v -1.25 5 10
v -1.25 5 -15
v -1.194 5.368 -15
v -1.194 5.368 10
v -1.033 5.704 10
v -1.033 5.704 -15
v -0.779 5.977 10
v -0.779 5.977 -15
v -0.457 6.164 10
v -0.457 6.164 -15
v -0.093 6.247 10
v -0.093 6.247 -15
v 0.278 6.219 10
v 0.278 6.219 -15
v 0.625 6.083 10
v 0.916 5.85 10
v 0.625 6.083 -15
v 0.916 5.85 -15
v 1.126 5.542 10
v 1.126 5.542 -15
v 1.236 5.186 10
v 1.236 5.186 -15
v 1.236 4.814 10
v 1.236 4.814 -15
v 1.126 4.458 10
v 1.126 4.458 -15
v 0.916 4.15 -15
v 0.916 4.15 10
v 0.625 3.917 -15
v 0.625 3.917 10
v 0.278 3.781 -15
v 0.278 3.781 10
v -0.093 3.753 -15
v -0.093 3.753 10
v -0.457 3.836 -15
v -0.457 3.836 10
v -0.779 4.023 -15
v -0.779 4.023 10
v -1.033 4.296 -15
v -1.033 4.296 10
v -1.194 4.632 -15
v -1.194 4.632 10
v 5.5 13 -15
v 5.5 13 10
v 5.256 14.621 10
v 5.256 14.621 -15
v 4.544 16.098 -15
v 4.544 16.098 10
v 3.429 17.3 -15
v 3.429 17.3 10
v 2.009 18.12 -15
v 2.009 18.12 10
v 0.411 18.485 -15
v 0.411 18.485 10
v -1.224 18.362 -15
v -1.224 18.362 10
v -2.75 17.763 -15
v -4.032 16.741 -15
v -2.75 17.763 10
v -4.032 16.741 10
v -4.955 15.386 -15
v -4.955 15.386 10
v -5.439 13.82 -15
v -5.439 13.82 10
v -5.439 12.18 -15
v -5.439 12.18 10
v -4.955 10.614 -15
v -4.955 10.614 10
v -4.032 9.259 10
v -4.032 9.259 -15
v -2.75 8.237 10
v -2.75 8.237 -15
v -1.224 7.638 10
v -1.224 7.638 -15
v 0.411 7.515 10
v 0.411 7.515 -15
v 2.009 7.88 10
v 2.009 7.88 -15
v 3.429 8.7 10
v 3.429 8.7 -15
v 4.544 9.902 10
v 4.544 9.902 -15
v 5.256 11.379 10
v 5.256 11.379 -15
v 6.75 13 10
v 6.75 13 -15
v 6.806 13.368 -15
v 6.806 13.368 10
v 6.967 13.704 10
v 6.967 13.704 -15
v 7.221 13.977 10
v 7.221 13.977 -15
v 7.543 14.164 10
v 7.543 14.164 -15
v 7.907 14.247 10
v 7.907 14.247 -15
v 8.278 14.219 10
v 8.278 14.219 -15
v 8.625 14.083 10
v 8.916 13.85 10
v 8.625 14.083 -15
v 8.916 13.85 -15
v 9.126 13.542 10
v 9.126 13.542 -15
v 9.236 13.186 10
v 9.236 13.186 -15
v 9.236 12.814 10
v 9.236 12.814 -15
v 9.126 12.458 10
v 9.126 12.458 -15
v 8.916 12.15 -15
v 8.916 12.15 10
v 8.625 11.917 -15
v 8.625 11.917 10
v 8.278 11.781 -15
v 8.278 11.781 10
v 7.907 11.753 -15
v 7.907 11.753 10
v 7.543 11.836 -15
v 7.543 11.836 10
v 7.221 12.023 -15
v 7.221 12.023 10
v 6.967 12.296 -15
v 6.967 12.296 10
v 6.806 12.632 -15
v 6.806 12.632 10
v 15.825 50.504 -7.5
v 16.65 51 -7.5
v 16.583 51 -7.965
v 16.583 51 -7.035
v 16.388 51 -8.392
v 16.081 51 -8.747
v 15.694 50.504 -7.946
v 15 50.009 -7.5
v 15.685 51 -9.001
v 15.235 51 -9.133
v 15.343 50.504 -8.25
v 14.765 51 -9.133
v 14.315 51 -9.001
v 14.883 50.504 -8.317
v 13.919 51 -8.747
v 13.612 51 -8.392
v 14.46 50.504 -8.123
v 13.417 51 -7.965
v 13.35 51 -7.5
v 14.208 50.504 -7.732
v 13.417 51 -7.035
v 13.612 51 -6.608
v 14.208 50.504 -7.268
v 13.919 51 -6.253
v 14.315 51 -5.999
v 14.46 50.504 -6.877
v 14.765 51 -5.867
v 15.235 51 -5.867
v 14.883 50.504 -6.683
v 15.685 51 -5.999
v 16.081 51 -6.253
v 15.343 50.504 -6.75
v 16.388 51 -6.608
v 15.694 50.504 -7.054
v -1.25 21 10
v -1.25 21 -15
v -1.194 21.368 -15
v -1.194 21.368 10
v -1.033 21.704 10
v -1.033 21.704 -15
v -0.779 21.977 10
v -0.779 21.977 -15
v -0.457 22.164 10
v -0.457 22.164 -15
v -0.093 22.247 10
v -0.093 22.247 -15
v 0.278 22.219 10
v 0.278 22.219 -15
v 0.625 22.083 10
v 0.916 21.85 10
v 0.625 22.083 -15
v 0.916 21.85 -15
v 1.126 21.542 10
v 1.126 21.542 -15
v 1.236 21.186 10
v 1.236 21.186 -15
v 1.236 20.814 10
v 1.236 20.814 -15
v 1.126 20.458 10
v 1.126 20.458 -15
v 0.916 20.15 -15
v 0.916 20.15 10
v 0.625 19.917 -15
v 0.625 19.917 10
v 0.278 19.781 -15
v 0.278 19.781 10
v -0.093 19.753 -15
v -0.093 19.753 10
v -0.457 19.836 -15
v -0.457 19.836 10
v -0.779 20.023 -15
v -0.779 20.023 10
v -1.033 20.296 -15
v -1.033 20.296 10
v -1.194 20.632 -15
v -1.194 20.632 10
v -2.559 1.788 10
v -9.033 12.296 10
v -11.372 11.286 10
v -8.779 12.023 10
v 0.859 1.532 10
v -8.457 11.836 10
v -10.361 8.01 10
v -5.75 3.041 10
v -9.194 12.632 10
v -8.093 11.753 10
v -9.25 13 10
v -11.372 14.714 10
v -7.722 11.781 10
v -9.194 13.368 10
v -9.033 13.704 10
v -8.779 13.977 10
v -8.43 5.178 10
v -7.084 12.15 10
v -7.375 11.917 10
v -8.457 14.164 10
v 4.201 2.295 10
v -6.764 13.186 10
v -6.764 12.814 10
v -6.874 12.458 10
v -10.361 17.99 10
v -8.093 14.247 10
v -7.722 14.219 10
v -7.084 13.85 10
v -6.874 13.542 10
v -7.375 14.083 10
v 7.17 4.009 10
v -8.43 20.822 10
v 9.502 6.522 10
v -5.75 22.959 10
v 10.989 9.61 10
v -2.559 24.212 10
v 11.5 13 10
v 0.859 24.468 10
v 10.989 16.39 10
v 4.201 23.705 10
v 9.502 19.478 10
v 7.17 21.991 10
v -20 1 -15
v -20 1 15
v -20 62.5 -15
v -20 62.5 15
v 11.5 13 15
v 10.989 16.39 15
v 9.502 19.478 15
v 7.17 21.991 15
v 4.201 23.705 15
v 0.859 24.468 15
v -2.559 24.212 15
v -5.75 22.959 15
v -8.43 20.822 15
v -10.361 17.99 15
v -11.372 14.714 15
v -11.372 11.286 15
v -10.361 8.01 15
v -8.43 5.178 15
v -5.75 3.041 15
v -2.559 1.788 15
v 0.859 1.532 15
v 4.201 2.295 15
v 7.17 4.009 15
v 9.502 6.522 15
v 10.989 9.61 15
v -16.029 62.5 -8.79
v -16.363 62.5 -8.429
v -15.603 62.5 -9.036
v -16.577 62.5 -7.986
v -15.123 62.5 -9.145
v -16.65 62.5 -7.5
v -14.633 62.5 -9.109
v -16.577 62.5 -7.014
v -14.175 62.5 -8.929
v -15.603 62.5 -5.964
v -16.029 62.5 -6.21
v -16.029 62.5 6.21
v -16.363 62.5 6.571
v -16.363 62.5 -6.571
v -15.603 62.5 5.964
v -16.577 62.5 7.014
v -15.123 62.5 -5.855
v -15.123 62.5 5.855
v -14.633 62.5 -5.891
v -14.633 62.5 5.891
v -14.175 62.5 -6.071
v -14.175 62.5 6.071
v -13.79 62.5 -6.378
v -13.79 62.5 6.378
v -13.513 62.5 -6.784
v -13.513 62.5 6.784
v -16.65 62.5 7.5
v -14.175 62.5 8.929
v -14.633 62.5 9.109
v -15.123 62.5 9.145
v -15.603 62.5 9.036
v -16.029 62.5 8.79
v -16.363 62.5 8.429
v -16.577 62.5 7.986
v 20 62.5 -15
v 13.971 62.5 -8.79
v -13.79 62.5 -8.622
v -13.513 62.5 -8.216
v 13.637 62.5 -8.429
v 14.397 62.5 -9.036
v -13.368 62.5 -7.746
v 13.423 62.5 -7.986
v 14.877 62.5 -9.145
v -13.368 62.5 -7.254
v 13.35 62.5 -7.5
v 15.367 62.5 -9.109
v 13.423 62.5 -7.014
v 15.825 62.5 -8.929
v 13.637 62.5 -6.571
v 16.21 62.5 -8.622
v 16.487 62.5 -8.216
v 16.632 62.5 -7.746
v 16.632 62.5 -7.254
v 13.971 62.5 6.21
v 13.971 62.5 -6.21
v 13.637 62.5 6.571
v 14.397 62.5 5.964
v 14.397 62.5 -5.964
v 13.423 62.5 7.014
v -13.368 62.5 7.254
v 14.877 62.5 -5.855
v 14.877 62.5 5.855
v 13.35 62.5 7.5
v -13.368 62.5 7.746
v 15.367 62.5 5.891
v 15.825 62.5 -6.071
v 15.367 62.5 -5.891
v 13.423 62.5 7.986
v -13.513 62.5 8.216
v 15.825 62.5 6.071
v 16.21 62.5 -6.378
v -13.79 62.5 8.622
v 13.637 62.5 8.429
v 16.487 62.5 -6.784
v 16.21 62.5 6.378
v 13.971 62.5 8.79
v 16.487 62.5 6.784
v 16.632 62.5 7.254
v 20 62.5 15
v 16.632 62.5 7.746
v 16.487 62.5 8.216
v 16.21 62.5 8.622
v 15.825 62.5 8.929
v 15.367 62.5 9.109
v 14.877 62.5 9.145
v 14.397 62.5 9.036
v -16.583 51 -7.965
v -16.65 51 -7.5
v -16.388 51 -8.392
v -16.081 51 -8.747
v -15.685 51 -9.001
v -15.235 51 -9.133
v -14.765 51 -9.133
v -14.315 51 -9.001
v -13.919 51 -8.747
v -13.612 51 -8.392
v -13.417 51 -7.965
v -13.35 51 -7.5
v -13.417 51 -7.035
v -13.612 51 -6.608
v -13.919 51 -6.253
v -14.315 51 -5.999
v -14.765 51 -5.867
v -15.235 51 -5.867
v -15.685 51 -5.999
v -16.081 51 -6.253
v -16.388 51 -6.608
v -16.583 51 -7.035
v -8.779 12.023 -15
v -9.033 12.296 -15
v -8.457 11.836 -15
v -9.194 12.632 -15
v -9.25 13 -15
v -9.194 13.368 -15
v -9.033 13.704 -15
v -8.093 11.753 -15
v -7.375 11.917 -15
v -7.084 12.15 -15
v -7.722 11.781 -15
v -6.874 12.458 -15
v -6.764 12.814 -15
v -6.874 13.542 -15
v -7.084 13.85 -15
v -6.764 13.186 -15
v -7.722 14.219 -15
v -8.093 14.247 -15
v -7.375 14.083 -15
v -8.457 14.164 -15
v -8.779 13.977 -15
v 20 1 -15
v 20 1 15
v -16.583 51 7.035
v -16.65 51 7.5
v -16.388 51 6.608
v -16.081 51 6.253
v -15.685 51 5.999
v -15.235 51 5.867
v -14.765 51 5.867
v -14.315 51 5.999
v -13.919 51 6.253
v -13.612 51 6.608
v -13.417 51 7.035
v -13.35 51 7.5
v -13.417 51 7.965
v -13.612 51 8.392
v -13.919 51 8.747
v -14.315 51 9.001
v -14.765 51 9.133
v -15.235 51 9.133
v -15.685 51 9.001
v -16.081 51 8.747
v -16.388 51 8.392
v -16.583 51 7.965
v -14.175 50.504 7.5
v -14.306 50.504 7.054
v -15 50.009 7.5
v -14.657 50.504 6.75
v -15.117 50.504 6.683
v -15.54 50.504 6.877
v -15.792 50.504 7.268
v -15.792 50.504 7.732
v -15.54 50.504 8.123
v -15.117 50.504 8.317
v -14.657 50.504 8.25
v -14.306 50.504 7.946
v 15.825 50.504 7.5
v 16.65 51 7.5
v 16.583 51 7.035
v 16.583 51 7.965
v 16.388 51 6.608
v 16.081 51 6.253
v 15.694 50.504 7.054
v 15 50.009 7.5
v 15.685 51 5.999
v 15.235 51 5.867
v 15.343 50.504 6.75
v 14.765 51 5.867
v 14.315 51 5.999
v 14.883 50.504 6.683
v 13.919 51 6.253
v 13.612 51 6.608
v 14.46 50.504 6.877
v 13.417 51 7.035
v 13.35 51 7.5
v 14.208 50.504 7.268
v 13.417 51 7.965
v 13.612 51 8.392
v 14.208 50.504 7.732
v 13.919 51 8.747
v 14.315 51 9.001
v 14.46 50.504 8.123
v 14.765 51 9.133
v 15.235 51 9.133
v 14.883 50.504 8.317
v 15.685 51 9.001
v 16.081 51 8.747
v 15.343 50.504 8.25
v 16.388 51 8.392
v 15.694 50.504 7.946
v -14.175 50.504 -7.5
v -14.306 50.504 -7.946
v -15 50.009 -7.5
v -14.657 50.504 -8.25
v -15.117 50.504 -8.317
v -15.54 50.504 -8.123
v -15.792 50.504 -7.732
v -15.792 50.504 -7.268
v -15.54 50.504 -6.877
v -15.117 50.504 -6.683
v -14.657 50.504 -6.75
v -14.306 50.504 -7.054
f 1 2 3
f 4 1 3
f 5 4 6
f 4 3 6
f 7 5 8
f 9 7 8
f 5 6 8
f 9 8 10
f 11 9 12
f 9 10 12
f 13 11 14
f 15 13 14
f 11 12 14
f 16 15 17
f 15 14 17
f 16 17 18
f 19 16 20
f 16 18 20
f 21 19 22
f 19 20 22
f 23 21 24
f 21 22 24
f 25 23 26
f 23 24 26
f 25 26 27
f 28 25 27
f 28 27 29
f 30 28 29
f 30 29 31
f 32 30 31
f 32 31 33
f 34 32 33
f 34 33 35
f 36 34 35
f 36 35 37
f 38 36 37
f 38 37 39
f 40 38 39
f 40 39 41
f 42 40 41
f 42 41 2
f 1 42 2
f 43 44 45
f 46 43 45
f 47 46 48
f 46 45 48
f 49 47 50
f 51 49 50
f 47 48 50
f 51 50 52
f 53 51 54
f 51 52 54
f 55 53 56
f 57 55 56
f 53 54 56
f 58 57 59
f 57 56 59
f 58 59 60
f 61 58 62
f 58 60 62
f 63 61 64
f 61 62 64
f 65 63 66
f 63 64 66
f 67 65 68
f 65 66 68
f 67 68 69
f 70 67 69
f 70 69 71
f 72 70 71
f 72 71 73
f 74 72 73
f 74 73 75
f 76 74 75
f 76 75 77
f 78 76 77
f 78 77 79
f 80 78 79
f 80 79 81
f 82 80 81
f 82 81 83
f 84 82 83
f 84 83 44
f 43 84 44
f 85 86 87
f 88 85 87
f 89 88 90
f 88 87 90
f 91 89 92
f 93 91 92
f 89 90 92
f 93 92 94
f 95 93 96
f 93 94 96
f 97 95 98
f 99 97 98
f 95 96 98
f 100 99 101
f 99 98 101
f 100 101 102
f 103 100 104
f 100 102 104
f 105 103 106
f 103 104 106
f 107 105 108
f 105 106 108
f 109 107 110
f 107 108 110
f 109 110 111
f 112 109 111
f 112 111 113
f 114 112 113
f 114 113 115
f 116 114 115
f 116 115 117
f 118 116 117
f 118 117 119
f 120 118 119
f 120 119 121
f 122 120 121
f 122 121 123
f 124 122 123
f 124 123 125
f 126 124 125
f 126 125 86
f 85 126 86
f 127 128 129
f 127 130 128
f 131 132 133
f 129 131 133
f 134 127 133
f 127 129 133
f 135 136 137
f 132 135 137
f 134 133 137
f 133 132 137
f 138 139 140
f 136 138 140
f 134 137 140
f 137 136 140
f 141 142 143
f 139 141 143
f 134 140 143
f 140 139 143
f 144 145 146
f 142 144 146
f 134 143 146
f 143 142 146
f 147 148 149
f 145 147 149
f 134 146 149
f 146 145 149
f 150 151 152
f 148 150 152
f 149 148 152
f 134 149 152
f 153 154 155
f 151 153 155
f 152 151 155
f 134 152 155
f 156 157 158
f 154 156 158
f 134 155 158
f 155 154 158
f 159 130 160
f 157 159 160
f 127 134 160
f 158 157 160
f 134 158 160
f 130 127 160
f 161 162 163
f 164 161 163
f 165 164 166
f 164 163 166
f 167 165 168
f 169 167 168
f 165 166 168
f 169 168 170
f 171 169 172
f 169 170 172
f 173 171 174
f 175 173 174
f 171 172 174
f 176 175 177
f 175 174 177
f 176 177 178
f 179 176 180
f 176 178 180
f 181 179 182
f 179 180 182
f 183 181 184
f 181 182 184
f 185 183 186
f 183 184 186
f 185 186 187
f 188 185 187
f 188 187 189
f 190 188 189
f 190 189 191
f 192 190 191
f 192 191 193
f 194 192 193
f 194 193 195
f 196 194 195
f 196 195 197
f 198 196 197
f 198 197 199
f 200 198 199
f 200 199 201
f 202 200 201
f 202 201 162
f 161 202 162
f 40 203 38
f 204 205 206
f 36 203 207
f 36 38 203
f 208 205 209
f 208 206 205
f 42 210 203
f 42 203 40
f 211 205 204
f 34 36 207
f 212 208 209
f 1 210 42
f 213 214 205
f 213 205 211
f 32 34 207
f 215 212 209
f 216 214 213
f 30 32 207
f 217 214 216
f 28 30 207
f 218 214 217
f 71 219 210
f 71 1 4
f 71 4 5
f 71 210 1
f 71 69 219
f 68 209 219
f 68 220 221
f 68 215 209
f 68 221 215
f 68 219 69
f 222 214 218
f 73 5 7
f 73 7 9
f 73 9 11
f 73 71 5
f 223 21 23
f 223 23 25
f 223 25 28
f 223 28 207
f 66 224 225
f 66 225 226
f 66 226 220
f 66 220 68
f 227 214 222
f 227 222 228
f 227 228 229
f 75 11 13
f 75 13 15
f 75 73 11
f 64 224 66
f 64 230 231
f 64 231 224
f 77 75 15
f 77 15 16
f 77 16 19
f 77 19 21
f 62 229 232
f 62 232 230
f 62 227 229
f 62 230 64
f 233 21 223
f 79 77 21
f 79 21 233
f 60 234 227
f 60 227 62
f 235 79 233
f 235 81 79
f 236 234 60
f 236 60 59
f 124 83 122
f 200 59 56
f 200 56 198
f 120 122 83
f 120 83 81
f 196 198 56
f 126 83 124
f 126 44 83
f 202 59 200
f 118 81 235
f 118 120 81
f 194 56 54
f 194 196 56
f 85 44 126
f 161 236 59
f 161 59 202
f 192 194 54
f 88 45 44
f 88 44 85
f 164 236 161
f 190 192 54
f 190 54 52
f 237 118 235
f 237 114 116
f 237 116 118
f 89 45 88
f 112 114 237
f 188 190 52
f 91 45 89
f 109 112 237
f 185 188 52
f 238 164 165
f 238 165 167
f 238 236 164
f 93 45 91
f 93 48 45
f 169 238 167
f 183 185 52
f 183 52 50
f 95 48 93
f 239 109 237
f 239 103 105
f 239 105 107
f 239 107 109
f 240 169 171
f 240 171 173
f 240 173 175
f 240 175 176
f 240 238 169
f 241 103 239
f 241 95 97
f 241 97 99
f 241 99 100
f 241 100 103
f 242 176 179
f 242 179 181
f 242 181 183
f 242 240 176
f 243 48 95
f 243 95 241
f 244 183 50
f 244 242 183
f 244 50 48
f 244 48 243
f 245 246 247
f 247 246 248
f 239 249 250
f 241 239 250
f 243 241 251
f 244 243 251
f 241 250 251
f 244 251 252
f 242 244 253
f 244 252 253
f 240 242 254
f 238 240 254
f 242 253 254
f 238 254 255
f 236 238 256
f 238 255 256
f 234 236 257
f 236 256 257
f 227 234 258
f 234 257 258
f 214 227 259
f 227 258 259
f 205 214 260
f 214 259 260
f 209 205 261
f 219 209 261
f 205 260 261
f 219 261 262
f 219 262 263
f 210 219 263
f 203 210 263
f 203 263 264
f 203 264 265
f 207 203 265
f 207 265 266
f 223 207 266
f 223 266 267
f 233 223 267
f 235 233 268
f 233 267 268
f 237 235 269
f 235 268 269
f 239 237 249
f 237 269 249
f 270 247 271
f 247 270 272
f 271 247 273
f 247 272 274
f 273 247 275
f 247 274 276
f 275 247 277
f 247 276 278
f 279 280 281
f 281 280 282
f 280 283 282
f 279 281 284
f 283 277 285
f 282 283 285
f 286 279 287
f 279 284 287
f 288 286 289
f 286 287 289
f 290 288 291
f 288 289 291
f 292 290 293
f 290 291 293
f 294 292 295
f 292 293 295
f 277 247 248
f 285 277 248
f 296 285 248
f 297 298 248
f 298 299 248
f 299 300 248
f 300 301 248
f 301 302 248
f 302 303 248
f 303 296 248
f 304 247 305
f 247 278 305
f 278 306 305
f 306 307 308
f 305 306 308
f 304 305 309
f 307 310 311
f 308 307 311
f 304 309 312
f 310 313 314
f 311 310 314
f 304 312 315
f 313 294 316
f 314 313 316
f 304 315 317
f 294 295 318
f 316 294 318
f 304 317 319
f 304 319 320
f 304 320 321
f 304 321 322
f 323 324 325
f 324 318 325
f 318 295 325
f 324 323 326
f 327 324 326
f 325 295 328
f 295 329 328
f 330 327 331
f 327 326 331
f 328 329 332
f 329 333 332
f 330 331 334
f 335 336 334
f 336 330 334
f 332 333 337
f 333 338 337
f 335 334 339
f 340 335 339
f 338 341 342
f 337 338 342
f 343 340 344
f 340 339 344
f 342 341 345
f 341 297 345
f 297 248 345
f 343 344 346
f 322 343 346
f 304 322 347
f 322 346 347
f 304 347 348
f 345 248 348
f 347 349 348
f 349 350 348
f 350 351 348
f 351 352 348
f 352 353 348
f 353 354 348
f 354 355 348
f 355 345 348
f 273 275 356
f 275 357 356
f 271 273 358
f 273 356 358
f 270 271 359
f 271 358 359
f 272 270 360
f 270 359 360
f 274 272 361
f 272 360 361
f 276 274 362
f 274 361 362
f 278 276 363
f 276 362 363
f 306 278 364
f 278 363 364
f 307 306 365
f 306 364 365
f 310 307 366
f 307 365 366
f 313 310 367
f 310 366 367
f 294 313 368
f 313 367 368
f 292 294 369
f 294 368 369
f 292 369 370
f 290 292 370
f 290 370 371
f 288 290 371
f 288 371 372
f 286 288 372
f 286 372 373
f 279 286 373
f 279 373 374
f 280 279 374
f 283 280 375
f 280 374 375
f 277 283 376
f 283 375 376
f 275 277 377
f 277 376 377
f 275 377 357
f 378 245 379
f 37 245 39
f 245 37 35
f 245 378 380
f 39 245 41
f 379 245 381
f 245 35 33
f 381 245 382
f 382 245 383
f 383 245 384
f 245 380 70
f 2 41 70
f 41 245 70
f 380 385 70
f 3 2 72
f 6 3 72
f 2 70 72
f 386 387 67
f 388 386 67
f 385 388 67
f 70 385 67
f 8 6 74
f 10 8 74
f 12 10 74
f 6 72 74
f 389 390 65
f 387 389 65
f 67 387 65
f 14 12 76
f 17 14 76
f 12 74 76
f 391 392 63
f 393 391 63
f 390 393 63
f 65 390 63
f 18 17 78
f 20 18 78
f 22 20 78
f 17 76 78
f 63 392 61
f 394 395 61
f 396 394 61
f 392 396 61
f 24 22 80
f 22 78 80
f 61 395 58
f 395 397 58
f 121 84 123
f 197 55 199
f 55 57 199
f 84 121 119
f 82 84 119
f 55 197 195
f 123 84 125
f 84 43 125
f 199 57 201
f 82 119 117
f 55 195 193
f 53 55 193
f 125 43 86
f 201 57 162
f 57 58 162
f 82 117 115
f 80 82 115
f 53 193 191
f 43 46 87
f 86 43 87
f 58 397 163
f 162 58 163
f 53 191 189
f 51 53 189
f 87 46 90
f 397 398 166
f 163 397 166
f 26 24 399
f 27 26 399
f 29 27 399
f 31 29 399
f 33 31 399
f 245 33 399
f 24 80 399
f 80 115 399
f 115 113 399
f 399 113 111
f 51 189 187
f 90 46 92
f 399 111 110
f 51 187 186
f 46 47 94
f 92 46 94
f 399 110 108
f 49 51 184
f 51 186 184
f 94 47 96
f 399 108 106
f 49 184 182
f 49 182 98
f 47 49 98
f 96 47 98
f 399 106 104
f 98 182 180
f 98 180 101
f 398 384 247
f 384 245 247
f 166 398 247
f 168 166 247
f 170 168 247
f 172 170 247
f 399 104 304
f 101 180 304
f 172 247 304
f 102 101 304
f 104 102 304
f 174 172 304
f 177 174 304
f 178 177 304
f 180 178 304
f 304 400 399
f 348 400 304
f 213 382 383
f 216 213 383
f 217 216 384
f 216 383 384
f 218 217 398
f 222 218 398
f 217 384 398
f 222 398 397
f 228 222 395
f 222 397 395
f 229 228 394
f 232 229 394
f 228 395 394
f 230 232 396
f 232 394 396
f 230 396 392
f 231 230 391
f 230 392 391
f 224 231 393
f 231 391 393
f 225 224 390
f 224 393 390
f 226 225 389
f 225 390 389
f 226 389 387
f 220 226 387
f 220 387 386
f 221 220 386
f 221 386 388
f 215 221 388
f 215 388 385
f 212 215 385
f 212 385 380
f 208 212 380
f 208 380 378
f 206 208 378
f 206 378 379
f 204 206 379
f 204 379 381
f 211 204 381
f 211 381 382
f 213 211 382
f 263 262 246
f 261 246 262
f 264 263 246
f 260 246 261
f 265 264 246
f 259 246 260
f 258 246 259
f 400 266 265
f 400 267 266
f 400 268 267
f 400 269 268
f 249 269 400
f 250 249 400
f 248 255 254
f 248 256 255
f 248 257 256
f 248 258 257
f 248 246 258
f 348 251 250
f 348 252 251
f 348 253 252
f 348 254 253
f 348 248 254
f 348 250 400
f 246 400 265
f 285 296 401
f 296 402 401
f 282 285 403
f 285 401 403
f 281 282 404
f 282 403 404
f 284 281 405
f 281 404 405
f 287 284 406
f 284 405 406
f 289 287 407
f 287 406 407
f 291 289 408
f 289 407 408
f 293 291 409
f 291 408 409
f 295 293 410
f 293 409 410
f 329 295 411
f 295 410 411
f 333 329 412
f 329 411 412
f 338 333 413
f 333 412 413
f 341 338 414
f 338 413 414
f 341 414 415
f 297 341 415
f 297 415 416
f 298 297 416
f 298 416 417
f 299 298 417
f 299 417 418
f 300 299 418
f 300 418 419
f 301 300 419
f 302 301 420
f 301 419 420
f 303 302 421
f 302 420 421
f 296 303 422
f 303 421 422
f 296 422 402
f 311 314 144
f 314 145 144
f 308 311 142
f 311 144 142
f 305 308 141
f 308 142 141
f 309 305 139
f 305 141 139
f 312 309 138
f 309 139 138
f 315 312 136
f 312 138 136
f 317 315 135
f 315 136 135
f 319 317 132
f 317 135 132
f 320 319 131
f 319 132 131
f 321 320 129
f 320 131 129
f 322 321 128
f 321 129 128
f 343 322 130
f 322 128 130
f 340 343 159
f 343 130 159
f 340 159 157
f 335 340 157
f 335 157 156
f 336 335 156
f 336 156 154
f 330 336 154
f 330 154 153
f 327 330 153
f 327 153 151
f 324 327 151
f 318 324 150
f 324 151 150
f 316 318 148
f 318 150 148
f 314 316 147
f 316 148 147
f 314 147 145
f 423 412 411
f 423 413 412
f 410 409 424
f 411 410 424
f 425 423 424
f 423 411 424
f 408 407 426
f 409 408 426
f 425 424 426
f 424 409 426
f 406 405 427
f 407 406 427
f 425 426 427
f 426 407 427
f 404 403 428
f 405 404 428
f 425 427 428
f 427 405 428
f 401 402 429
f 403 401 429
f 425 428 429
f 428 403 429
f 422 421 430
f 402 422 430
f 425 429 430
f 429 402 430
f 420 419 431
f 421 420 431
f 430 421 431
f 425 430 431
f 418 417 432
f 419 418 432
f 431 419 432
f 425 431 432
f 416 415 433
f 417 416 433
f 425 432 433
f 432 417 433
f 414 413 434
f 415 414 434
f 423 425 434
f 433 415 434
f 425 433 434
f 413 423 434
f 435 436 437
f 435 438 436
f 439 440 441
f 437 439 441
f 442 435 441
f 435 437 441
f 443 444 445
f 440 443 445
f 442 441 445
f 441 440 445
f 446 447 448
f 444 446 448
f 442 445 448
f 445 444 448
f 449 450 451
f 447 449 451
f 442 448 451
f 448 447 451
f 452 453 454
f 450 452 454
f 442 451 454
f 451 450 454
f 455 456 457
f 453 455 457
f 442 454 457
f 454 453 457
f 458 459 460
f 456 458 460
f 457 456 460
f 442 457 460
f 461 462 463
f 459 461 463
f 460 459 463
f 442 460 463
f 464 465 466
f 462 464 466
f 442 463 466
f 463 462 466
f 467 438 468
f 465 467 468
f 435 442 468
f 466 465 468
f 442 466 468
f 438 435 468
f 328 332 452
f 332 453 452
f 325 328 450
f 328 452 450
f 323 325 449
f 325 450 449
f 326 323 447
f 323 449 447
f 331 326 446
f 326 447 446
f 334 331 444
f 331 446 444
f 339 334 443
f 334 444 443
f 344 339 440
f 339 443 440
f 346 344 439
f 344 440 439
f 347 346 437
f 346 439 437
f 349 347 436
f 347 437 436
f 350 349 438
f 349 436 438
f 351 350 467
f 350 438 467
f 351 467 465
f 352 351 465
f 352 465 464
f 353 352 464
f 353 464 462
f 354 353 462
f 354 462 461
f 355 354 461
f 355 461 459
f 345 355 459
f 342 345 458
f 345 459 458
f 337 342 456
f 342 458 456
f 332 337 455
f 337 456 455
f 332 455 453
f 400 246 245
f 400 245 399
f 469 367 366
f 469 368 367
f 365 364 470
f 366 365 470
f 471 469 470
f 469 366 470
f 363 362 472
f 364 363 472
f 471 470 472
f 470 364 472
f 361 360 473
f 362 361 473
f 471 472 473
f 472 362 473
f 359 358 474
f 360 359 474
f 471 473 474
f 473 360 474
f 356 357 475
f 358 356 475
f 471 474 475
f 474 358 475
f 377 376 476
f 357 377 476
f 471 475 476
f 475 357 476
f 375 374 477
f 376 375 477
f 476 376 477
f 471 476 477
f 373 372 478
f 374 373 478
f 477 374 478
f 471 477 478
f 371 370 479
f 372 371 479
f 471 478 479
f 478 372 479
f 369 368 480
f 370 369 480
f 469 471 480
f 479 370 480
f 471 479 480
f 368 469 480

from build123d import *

# Parameters (mm, degrees)
SKETCH1_W             = 40
SKETCH1_H             = 62.5
BOSS_EXTRUDE1_DEPTH   = 15
SKETCH2_R             = 11.5
CUT_EXTRUDE1_DEPTH    = 5
SKETCH3_R             = 5.5
CUT_EXTRUDE2_DEPTH    = 71.222859526
M4_TAPPED_HOLE1_D     = 3.3
M4_TAPPED_HOLE1_DEPTH = 11.5
M4_TAPPED_HOLE1_TIP   = 0.991420021
M3_TAPPED_HOLE2_D     = 2.5
SKETCH9_W             = 40
SKETCH9_H             = 1
CUT_EXTRUDE4_DEPTH    = 73.154348448


with BuildPart() as part:
    # Sketch1 → Boss-Extrude1 (new, symmetric)
    with BuildSketch(Plane.XY):
        with Locations((0, 31.25)):
            Rectangle(SKETCH1_W, SKETCH1_H)
    extrude(amount=BOSS_EXTRUDE1_DEPTH, both=True)

    # Sketch2 → Cut-Extrude1 (cut)
    with BuildSketch(Plane.XY.offset(15)):
        with Locations((0, 13)):
            Circle(SKETCH2_R)
    extrude(amount=-CUT_EXTRUDE1_DEPTH, mode=Mode.SUBTRACT)

    # Sketch3 → Cut-Extrude2 (cut, through all)
    with BuildSketch(Plane.XY.offset(10)):
        with Locations((0, 13)):
            Circle(SKETCH3_R)
    extrude(amount=-CUT_EXTRUDE2_DEPTH, mode=Mode.SUBTRACT)

    # M4 Tapped Hole1
    with Locations(Plane(origin=(0, 62.5, 0), x_dir=(1, 0, 0), z_dir=(0, 1, 0))):
        with Locations((-15, 7.5), (15, 7.5), (15, -7.5), (-15, -7.5)):
            Hole(M4_TAPPED_HOLE1_D / 2, depth=M4_TAPPED_HOLE1_DEPTH)
            with Locations((0, 0, -(M4_TAPPED_HOLE1_DEPTH + M4_TAPPED_HOLE1_TIP / 2))):  # 118° drill point
                Cone(0, M4_TAPPED_HOLE1_D / 2, M4_TAPPED_HOLE1_TIP, mode=Mode.SUBTRACT)

    # M3 Tapped Hole2 (through all)
    with Locations(Plane.XY.offset(10)):
        with Locations((0, 13), (0, 21), (0, 5), (-8, 13), (8, 13)):
            Hole(M3_TAPPED_HOLE2_D / 2)

    # Sketch9 → Cut-Extrude4 (cut, through all)
    with BuildSketch(Plane.XY.offset(15)):
        with Locations((0, 0.5)):
            Rectangle(SKETCH9_W, SKETCH9_H)
    extrude(amount=-CUT_EXTRUDE4_DEPTH, mode=Mode.SUBTRACT)


solid = part.part
